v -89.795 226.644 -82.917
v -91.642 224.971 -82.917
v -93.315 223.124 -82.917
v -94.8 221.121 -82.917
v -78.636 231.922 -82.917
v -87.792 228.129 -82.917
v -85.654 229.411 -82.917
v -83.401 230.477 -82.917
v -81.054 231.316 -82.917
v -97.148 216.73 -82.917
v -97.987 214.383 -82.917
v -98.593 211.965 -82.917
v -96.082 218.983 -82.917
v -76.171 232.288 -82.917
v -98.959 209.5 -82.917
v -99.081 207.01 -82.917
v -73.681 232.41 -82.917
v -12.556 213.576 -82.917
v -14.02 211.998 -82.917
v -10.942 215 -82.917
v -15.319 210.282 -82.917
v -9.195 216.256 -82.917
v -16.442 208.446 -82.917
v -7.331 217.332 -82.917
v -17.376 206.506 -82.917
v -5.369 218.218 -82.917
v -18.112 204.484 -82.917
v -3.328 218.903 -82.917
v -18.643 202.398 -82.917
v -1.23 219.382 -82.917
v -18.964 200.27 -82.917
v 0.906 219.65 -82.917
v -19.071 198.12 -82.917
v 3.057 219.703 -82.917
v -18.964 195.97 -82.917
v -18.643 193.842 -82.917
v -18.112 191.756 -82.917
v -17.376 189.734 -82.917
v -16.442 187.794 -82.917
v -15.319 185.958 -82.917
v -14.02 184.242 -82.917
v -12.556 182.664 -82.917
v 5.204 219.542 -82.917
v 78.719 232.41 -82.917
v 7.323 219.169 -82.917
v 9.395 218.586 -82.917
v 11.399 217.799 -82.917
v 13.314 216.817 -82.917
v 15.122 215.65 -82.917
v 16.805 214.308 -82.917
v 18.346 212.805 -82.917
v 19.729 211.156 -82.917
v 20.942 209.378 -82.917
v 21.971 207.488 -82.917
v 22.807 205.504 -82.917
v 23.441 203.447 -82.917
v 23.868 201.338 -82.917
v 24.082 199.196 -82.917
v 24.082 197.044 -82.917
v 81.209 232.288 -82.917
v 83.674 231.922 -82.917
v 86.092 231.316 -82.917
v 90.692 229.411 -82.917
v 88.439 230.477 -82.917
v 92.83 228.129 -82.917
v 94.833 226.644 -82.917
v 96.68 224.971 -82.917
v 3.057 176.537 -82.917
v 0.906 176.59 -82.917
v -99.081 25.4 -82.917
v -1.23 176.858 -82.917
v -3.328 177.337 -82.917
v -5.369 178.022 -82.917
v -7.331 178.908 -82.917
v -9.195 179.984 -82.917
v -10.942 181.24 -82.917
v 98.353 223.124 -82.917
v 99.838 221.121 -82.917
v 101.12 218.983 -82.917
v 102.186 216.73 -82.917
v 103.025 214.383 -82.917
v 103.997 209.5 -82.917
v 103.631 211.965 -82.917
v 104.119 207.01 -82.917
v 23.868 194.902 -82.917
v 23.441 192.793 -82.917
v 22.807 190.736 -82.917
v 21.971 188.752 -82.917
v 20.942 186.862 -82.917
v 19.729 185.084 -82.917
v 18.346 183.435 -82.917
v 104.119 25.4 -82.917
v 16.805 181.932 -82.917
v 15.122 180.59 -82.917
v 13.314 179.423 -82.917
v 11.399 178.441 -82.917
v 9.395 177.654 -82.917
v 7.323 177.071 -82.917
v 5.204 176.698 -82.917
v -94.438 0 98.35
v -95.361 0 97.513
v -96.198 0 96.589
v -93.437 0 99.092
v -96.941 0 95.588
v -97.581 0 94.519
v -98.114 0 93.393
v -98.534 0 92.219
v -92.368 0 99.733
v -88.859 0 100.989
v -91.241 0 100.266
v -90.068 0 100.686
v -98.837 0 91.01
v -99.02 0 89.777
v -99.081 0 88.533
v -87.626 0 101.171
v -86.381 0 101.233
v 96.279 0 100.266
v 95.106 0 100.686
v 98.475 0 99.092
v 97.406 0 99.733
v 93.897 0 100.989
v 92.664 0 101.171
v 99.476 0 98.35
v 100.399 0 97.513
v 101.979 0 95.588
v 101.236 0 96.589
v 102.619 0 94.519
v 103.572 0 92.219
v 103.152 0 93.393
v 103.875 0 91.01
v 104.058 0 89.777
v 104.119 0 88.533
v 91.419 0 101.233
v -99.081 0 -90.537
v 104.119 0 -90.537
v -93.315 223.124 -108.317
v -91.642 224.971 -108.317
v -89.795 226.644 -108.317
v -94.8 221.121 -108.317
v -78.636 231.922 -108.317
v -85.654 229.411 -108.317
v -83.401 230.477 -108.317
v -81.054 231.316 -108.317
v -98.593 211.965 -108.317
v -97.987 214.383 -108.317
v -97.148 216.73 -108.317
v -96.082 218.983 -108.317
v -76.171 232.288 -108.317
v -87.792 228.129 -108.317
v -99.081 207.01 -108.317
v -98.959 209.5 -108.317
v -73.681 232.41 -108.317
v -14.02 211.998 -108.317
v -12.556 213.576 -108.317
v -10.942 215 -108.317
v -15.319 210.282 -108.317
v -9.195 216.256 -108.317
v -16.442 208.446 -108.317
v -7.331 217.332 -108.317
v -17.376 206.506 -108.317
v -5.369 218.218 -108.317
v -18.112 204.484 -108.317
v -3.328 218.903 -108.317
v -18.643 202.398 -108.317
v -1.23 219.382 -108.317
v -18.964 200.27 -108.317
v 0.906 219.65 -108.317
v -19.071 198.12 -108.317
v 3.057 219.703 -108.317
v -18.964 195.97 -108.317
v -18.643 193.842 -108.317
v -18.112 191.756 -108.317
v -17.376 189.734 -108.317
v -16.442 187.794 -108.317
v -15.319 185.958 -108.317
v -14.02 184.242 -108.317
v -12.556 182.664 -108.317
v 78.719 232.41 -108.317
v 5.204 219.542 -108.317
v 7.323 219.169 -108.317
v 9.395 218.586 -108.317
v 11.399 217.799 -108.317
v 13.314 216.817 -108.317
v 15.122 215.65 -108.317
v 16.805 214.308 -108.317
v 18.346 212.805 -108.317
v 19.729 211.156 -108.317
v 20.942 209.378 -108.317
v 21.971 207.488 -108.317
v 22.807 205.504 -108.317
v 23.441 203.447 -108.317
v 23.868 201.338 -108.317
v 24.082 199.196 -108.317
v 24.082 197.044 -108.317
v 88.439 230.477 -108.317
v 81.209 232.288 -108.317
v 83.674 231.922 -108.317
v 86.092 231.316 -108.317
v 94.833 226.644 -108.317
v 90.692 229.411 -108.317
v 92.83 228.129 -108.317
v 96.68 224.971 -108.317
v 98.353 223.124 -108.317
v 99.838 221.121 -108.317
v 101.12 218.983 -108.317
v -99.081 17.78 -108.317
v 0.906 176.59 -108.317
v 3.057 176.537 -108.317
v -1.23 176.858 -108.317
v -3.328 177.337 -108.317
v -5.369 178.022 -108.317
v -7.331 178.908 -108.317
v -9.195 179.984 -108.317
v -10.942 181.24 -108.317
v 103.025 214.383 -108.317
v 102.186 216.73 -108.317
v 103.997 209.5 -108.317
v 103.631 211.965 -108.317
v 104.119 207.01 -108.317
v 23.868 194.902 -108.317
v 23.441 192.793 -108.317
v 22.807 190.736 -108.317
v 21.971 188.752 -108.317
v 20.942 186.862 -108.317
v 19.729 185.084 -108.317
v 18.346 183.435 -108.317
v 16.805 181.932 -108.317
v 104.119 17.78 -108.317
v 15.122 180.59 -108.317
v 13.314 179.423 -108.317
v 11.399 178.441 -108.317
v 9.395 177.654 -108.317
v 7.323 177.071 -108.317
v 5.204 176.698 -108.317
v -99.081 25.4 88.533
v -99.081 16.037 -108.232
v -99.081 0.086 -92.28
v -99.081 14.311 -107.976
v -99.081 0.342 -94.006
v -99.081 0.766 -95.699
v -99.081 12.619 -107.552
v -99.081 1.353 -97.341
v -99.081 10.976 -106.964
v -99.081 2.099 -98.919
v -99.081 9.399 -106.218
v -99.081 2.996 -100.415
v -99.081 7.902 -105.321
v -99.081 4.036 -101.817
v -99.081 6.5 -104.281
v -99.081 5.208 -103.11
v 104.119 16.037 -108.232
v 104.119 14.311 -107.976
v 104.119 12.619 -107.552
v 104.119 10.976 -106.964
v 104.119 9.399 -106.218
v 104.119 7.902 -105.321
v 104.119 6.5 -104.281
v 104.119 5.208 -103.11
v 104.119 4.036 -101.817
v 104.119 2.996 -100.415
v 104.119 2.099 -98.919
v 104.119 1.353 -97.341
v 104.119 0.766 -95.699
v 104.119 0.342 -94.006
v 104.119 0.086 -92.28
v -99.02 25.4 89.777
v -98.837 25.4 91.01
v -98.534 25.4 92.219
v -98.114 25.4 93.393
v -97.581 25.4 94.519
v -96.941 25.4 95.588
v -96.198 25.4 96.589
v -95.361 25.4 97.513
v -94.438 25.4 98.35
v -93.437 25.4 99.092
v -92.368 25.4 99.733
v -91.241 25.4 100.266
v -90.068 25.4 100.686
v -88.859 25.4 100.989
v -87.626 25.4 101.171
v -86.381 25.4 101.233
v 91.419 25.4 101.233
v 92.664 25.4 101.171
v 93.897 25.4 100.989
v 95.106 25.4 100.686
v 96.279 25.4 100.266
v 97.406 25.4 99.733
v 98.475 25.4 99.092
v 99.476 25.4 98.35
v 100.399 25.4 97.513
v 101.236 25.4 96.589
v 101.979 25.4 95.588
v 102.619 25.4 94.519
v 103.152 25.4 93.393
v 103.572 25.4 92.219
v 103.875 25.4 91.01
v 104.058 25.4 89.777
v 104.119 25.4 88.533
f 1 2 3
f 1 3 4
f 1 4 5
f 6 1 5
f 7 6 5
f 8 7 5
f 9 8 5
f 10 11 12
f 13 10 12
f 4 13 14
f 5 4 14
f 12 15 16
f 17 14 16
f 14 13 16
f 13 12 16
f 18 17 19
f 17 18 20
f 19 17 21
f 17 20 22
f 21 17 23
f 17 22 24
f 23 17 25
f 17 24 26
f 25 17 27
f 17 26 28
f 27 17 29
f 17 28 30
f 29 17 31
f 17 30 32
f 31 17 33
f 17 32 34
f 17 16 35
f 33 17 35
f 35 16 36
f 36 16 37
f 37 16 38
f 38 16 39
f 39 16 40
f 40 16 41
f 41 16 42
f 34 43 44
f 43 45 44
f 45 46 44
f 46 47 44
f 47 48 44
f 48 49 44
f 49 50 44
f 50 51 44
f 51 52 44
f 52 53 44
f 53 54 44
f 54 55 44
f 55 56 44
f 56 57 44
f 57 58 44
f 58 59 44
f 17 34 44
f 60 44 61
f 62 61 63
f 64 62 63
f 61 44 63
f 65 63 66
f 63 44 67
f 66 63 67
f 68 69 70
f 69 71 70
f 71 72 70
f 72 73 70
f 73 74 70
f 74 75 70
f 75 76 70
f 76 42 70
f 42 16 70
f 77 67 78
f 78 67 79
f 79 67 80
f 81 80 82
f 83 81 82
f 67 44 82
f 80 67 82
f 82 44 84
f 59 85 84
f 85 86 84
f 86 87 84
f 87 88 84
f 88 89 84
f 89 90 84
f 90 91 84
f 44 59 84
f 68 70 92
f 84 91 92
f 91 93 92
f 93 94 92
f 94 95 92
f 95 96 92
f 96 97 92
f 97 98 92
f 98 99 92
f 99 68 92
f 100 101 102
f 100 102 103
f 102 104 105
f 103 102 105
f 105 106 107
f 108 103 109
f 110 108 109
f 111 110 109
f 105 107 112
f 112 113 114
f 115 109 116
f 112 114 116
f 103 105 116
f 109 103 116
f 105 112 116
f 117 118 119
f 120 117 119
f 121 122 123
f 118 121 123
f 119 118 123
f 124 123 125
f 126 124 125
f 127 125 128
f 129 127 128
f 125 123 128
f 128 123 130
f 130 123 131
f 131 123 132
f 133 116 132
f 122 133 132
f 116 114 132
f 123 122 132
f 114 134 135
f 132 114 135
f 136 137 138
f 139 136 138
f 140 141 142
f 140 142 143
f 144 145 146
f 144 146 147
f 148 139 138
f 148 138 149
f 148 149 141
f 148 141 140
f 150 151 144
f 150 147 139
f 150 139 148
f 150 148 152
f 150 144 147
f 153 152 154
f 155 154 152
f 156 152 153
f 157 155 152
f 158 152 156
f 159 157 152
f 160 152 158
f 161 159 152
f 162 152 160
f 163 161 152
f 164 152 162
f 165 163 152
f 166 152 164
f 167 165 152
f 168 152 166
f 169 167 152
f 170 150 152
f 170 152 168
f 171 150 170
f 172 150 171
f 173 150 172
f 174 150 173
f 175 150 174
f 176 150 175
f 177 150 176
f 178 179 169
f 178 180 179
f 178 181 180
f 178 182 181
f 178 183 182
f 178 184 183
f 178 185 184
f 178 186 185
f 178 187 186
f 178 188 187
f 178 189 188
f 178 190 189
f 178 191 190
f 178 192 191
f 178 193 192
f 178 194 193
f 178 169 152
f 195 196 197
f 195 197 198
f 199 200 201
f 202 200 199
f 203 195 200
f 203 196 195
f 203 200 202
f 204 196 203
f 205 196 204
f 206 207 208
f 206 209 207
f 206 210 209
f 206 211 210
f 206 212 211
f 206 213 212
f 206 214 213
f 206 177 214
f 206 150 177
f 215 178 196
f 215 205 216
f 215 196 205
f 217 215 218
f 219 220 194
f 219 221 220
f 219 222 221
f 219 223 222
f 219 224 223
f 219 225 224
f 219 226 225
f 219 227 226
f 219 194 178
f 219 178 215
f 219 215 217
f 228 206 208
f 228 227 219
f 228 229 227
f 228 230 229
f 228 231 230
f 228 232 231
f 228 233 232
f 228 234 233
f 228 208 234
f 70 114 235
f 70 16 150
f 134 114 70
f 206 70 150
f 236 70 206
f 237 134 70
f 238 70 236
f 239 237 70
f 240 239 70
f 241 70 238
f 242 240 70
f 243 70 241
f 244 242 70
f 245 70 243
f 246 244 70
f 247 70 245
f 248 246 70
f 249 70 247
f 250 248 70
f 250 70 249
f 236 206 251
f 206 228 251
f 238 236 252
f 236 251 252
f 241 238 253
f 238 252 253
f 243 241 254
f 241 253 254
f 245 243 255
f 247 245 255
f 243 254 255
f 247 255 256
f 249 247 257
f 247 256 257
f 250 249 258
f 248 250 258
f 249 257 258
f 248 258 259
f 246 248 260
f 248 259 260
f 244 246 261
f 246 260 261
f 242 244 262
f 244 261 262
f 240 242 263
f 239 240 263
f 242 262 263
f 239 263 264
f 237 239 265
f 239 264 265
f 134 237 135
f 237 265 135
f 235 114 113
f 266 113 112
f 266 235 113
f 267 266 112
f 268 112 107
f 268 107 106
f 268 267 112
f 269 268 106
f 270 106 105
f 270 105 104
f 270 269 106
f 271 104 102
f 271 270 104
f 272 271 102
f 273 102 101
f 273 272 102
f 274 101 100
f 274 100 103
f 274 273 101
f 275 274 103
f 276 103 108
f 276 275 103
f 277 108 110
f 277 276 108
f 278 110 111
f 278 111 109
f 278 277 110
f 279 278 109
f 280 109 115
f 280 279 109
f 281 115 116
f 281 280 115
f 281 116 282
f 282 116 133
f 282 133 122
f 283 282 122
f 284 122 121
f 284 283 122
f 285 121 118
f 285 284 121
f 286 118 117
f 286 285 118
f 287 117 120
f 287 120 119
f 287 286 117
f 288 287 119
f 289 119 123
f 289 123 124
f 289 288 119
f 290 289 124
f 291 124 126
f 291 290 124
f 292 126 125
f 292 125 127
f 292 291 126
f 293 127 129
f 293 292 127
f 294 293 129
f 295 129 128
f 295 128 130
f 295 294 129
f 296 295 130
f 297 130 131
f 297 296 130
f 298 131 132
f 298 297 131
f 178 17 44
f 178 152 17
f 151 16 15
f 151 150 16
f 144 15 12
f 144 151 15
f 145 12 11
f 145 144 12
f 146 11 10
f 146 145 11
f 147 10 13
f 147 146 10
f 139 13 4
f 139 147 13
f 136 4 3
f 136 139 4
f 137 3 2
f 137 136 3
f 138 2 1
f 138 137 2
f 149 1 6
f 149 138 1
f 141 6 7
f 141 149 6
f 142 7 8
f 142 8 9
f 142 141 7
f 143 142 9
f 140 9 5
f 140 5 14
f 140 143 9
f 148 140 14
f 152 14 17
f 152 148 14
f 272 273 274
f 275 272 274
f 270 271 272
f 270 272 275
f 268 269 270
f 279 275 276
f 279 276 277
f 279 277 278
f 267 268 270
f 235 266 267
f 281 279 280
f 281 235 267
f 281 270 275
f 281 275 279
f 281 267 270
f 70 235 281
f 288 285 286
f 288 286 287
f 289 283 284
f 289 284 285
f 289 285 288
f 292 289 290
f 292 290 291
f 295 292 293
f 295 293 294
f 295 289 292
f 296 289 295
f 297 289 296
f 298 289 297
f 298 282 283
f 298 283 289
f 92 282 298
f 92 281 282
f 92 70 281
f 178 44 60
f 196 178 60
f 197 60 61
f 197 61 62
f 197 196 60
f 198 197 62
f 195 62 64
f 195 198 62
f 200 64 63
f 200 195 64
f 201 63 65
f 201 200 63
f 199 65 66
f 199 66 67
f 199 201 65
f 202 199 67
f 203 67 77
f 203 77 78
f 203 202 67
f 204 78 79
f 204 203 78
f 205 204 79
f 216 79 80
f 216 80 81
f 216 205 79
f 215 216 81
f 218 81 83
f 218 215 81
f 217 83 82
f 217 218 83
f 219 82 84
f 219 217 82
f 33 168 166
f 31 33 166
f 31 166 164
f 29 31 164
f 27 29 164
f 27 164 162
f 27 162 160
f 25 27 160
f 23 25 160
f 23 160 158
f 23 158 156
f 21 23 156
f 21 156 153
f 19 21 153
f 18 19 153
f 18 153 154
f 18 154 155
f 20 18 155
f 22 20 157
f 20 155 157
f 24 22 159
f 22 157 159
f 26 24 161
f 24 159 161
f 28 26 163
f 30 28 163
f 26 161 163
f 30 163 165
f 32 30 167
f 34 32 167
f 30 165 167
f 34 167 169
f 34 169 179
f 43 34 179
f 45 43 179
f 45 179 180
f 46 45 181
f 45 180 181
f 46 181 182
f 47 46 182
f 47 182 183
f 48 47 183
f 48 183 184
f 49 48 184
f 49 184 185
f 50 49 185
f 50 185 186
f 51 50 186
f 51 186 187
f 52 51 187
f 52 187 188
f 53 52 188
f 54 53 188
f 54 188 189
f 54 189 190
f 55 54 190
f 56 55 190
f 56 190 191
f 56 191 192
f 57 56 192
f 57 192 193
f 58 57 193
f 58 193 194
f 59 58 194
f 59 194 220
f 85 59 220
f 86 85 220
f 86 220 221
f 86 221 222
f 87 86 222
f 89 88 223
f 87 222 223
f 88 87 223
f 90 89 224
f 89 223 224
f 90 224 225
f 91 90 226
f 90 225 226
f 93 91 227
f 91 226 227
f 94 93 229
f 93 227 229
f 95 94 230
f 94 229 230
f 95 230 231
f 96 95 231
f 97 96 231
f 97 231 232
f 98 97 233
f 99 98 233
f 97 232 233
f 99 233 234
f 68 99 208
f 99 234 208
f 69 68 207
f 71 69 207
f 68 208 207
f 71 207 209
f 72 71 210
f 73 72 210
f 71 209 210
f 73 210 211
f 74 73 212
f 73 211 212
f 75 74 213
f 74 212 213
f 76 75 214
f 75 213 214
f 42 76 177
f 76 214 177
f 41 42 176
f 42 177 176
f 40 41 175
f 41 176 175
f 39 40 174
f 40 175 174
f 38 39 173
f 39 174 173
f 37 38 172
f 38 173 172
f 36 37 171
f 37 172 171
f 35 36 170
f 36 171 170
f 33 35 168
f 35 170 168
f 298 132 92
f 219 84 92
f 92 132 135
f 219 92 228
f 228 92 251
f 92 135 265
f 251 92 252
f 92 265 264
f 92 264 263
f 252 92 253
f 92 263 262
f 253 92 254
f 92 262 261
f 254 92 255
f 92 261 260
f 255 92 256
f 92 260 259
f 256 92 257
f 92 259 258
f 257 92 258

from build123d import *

# Parameters (mm, degrees)
SKETCH1_W           = 203.2
SKETCH1_H           = 209.55
BOSS_EXTRUDE2_DEPTH = 25.4
SKETCH2_W           = 203.2
SKETCH2_H           = 25.4
BOSS_EXTRUDE3_DEPTH = 207.01
CUT_EXTRUDE1_REACH  = 211.55
SKETCH3_R           = 21.59
FILLET1_R           = 17.78
FILLET2_R           = 25.4
FILLET3_R           = 12.7


with BuildPart() as part:
    # Sketch1 → Boss-Extrude2 (new body)
    with BuildSketch(Plane(origin=(0, 0, 0), x_dir=(1, 0, 0), z_dir=(0, 1, 0))):
        with Locations((2.519008264, 3.542355372)):
            Rectangle(SKETCH1_W, SKETCH1_H)
    extrude(amount=BOSS_EXTRUDE2_DEPTH)

    # Sketch2 → Boss-Extrude3 (add)
    with BuildSketch(Plane(origin=(0, 25.4, 0), x_dir=(1, 0, 0), z_dir=(0, 1, 0))):
        with Locations((2.519008264, 95.617355372)):
            Rectangle(SKETCH2_W, SKETCH2_H)
    extrude(amount=BOSS_EXTRUDE3_DEPTH)

    # Sketch3 → Cut-Extrude1 (cut, up to next)
    with BuildSketch(Plane(origin=(0, 0, -108.317355372), x_dir=(-1, 0, 0), z_dir=(0, 0, -1)), mode=Mode.PRIVATE) as cut_extrude1_sk1:
        with Locations((-2.519008264, 198.12)):
            Circle(SKETCH3_R)
    cut_extrude1_tool1 = extrude(cut_extrude1_sk1.sketch, amount=-CUT_EXTRUDE1_REACH, mode=Mode.PRIVATE) & part.part
    add(cut_extrude1_tool1.solids().sort_by_distance((2.519008, 198.12, -108.317355))[0], mode=Mode.SUBTRACT)

    # Fillet1
    fillet1_edges = [part.edges().sort_by_distance(p)[0] for p in [
        (2.519008264, 0, -108.317355372),
    ]]
    fillet(fillet1_edges, radius=FILLET1_R)

    # Fillet2
    fillet2_edges = [part.edges().sort_by_distance(p)[0] for p in [
        (-99.080991736, 232.41, -95.617355372),
        (104.119008264, 232.41, -95.617355372),
    ]]
    fillet(fillet2_edges, radius=FILLET2_R)

    # Fillet3
    fillet3_edges = [part.edges().sort_by_distance(p)[0] for p in [
        (104.119008264, 12.7, 101.232644628),
        (-99.080991736, 12.7, 101.232644628),
    ]]
    fillet(fillet3_edges, radius=FILLET3_R)


solid = part.part
